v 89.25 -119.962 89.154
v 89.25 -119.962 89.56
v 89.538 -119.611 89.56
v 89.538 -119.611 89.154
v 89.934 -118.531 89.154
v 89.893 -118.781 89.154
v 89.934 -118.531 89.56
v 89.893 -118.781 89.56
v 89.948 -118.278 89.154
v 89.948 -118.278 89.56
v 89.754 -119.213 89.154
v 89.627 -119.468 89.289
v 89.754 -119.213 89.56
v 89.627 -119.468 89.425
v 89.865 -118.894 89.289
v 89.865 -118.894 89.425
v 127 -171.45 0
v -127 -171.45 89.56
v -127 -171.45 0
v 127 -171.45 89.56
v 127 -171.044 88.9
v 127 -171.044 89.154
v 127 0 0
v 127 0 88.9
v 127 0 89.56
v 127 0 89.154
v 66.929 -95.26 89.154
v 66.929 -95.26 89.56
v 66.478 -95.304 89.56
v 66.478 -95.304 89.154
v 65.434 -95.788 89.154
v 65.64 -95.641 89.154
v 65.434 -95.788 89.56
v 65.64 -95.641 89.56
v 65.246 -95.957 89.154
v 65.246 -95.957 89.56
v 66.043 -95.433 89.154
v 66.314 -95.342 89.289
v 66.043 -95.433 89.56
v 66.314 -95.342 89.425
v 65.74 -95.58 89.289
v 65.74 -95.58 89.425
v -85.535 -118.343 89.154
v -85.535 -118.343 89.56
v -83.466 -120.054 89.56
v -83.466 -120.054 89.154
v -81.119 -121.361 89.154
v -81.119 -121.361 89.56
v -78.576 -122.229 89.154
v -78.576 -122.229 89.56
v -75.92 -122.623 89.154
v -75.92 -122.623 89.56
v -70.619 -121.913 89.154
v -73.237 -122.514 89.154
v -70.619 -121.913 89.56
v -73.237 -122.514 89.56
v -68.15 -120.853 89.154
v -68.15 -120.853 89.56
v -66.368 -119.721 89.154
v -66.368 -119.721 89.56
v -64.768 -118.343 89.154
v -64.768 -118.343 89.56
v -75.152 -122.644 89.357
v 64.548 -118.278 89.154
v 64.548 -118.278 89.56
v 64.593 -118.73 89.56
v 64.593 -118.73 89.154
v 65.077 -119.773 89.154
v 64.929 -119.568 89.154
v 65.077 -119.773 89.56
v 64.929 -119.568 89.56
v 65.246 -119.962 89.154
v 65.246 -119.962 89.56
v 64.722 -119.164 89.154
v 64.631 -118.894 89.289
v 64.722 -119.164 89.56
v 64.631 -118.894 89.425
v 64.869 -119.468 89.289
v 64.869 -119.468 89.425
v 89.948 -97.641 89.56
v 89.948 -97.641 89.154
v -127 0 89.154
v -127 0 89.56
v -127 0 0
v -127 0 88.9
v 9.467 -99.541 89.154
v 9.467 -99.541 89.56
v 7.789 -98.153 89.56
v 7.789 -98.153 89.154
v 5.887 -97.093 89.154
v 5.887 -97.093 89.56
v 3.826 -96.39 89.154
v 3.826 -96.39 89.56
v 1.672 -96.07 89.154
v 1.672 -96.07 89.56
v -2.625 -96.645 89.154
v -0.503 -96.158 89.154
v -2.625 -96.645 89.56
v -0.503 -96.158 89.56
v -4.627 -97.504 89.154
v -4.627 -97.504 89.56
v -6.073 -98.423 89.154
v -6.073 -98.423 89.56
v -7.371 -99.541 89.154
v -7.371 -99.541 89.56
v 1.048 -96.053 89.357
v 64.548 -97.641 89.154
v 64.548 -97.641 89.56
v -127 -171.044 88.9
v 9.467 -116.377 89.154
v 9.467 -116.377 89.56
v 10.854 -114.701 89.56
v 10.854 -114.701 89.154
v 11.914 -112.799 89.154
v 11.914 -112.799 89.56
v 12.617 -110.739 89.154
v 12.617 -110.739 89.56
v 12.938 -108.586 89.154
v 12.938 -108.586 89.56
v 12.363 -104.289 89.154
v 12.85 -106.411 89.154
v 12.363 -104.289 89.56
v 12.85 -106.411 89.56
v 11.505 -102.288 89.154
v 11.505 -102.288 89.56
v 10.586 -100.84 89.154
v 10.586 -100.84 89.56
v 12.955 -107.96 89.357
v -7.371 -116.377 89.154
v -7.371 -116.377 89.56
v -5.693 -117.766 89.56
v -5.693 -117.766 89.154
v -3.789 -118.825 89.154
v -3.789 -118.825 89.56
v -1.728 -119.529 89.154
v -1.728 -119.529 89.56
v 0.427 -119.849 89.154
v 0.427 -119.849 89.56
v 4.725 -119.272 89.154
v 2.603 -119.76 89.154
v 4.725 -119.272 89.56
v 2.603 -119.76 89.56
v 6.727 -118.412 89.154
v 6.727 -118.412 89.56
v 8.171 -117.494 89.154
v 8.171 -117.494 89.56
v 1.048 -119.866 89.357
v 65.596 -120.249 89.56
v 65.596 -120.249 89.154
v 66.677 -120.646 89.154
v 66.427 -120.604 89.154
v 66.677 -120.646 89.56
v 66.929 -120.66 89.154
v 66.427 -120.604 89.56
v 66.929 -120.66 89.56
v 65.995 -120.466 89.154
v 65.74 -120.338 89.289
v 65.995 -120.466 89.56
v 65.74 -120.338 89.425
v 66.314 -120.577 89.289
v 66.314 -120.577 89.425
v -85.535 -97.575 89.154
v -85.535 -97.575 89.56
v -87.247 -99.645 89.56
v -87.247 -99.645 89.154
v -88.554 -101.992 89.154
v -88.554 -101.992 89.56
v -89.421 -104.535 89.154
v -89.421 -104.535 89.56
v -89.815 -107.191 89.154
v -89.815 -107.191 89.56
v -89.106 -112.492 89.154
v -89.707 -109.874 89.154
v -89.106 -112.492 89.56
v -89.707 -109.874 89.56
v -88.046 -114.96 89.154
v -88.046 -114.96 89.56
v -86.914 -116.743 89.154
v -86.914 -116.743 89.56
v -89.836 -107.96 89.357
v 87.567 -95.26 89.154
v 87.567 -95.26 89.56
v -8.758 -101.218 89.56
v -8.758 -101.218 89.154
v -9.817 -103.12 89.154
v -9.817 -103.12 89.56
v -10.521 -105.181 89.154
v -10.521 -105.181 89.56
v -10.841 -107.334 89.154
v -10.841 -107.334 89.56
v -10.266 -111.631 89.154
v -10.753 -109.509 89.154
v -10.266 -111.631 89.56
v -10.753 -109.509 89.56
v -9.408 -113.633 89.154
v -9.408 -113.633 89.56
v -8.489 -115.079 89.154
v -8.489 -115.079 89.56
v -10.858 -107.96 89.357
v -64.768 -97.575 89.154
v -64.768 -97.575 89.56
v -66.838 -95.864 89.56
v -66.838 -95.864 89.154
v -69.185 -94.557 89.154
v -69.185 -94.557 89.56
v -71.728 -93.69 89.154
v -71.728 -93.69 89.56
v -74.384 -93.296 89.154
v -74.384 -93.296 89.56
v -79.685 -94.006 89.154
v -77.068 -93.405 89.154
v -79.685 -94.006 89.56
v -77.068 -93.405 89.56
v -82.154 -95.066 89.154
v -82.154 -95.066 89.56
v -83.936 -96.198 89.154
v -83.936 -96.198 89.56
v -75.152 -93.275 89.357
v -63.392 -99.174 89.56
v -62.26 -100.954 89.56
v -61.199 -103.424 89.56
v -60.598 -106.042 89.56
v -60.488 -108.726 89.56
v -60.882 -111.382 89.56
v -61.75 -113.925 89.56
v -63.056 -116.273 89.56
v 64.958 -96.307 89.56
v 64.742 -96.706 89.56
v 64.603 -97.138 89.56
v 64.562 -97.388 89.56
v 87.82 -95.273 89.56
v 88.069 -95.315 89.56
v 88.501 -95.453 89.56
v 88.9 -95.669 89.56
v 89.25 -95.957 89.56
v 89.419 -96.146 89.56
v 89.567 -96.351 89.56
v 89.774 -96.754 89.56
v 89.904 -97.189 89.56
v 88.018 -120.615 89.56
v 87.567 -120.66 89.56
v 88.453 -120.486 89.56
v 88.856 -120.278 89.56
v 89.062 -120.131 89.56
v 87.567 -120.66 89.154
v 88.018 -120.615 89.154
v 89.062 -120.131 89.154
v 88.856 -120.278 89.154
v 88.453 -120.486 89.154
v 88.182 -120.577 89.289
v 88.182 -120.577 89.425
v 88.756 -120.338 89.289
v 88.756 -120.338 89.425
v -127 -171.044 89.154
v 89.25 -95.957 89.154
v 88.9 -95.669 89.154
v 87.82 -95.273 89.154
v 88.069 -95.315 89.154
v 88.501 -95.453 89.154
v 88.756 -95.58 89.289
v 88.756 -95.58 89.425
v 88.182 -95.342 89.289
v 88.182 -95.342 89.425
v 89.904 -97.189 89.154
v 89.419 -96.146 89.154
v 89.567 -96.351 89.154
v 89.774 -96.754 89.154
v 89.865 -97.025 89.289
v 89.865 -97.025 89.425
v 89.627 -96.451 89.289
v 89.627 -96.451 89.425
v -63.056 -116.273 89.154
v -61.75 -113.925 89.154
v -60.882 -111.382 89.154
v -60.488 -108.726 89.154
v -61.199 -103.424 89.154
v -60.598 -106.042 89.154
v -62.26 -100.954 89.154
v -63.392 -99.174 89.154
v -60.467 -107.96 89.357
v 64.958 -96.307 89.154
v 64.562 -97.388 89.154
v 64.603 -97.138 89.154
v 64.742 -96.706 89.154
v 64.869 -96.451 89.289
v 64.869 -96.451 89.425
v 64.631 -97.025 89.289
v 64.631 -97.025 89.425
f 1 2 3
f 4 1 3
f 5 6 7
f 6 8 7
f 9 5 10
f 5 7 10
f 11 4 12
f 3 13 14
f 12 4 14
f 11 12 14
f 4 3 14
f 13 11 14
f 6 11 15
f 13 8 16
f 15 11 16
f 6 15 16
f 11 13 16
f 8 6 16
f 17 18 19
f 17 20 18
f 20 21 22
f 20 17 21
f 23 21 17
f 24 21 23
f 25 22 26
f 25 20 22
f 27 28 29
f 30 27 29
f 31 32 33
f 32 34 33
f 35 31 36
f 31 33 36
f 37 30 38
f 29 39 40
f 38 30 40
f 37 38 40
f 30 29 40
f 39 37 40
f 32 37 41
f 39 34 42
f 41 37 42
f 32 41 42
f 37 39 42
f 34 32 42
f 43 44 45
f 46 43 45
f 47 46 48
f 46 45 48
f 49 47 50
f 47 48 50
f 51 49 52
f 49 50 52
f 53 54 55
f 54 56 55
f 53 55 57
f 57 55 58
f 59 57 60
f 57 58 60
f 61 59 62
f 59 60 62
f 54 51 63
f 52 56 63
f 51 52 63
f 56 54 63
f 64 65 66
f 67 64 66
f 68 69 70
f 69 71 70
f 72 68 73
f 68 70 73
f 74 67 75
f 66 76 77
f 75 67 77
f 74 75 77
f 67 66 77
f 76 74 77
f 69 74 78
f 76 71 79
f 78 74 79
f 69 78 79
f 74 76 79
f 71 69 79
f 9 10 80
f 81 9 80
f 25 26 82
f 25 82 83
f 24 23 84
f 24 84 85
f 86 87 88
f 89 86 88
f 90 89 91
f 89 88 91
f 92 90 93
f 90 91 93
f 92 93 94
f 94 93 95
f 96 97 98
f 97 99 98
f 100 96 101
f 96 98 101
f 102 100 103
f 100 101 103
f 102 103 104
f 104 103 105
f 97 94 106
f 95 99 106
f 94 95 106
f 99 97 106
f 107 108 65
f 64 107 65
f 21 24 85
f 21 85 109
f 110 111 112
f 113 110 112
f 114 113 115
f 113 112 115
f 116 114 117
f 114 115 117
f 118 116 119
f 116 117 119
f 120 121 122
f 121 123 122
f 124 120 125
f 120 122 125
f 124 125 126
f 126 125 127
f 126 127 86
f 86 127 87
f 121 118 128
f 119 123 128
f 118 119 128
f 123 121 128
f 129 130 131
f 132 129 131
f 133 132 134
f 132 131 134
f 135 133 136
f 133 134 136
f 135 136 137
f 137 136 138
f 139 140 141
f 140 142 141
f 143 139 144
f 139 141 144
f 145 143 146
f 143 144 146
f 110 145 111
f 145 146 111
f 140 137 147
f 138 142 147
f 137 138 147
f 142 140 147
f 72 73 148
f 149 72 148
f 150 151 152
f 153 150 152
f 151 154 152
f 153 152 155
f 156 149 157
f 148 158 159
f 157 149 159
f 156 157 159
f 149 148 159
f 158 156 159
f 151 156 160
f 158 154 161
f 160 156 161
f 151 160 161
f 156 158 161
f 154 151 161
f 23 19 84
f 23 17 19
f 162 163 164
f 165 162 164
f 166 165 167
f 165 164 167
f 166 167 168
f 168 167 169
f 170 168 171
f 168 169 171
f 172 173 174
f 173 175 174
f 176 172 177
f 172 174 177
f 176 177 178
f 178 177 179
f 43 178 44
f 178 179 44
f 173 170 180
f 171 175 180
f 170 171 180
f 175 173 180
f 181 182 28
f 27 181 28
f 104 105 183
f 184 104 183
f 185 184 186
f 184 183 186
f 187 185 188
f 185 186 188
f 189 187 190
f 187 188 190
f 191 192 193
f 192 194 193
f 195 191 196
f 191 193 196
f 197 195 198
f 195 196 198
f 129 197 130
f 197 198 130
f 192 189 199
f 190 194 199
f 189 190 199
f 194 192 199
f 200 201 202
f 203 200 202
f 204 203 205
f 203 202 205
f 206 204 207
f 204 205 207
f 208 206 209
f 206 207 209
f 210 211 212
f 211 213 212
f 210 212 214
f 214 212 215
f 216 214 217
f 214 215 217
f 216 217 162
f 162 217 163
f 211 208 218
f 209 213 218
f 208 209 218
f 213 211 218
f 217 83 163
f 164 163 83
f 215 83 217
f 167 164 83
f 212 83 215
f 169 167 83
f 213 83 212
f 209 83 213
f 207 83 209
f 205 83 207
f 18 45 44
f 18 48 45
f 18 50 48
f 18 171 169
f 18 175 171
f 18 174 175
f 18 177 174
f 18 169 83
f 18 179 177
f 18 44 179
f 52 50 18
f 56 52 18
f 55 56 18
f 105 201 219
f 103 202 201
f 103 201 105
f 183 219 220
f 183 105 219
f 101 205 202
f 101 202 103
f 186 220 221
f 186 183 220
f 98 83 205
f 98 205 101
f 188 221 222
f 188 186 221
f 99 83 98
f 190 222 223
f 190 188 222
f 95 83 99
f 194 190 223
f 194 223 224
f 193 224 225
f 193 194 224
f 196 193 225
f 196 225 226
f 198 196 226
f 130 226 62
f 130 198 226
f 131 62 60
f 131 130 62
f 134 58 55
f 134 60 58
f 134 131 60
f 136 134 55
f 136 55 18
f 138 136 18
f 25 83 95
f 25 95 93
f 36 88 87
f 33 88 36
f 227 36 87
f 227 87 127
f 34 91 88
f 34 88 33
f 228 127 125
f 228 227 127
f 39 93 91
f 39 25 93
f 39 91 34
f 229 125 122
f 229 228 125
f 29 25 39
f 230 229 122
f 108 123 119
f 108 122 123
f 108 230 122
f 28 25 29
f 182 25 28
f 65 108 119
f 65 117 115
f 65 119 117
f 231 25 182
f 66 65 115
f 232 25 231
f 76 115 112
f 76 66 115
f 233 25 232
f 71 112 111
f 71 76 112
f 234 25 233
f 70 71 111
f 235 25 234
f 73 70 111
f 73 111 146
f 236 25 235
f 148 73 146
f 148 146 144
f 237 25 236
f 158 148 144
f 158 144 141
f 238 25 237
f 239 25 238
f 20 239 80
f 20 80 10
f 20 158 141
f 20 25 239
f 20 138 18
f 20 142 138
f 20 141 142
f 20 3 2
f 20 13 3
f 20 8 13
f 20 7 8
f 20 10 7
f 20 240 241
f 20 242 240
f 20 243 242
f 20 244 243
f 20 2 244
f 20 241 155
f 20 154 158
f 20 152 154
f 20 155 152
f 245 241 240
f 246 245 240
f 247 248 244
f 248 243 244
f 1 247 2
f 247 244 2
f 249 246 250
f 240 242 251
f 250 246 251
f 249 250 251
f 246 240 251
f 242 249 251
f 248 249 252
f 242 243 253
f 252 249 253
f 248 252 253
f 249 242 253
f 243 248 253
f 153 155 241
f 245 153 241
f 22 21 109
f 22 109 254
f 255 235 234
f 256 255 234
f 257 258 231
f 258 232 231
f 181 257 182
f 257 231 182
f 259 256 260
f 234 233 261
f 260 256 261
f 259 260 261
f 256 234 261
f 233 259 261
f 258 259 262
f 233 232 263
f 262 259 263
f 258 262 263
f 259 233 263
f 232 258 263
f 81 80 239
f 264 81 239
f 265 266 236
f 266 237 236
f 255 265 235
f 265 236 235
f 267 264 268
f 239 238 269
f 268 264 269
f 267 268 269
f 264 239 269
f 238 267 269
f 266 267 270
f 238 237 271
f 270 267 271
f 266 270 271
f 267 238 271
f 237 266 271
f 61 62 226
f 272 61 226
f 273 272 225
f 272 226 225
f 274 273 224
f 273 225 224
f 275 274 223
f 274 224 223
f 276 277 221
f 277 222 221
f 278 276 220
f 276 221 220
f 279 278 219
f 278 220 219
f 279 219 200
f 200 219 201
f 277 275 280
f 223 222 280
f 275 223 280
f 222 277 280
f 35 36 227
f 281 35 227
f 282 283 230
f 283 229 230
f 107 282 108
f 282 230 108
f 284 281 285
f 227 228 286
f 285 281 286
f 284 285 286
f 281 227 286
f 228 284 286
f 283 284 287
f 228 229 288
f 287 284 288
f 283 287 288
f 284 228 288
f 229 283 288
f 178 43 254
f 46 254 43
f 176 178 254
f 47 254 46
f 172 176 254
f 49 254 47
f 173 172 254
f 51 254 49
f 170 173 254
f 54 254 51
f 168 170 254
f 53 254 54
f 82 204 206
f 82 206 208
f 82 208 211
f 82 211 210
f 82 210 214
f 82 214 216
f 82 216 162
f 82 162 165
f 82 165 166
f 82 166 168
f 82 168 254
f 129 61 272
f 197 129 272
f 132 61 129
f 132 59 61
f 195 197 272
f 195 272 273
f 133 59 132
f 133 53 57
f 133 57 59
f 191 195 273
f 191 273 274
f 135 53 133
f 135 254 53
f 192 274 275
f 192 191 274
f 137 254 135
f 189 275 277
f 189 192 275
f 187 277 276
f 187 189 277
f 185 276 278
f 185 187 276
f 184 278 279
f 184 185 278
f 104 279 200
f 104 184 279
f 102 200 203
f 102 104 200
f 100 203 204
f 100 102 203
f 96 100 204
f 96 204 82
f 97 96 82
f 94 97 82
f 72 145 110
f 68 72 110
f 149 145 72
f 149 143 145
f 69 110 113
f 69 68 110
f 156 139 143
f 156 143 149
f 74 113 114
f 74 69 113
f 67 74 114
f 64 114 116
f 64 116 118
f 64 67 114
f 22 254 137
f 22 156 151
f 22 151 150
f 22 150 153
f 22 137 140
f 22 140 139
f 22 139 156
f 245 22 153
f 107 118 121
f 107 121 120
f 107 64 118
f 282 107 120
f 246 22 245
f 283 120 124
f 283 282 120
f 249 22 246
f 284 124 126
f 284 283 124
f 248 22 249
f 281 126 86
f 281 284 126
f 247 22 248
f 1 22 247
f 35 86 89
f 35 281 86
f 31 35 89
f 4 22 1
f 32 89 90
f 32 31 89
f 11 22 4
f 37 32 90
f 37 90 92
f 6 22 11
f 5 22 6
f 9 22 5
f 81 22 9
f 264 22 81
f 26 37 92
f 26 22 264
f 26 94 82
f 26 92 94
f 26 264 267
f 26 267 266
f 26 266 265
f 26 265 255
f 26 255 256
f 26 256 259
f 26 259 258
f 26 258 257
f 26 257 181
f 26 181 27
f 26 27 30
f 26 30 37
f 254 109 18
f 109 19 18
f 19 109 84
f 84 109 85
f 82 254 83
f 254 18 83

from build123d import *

# Parameters (mm, degrees)
F1_DEPTH = 127
F3_DEPTH = 0.4064


# Not quite as in the source:
# - the dataset's text gives a spline's control points without its knots; the knots are read off the source's solid


with BuildPart() as f1:
    # F0 (on Right) → F1 (new body, symmetric)
    with BuildSketch(Plane.YZ):
        Polygon((-171.45, 0), (0, 0), (0, 88.9), (-171.0436, 88.9), (-171.0436, 89.154), (0, 89.154), (0, 89.5604), (-171.45, 89.5604), align=None)
    extrude(amount=F1_DEPTH, both=True)

    # F2 (on face) → F3 (cut, through all)
    with BuildSketch(Plane.XY.offset(89.5604)):
        with BuildLine():
            add(Edge.make_bspline(
                [(89.2501661772, -119.9617381969), (89.6911355772, -119.5207687969), (89.9481327772, -118.9020247969), (89.9481327772, -118.2782769969)],
                knots=[1, 1, 1, 1, 2, 2, 2, 2], degree=3))
            Line((89.9481327772, -118.2782769969), (89.9481327772, -97.6407769969))
            add(Edge.make_bspline(
                [(89.9481327772, -97.6407769969), (89.9481327772, -97.0166989969), (89.6911355772, -96.3979803969), (89.2501661772, -95.9570109969)],
                knots=[0, 0, 0, 0, 1, 1, 1, 1], degree=3))
            add(Edge.make_bspline(
                [(89.2501661772, -95.9570109969), (88.8091967772, -95.5160161969), (88.1904527772, -95.2595269969), (87.5668827772, -95.2595269969)],
                knots=[1, 1, 1, 1, 2, 2, 2, 2], degree=3))
            Line((87.5668827772, -95.2595269969), (66.9293827772, -95.2595269969))
            add(Edge.make_bspline(
                [(66.9293827772, -95.2595269969), (66.3058127772, -95.2595269969), (65.6863829772, -95.5160161969), (65.2457691772, -95.9570109969)],
                knots=[0, 0, 0, 0, 1, 1, 1, 1], degree=3))
            add(Edge.make_bspline(
                [(65.2457691772, -95.9570109969), (64.8051299772, -96.3979803969), (64.5481327772, -97.0166989969), (64.5481327772, -97.6407769969)],
                knots=[1, 1, 1, 1, 2, 2, 2, 2], degree=3))
            Line((64.5481327772, -97.6407769969), (64.5481327772, -118.2782769969))
            add(Edge.make_bspline(
                [(64.5481327772, -118.2782769969), (64.5481327772, -118.9020247969), (64.8051299772, -119.5207687969), (65.2457691772, -119.9617381969)],
                knots=[0, 0, 0, 0, 1, 1, 1, 1], degree=3))
            add(Edge.make_bspline(
                [(65.2457691772, -119.9617381969), (65.6863829772, -120.4023519969), (66.3058127772, -120.6595269969), (66.9293827772, -120.6595269969)],
                knots=[1, 1, 1, 1, 2, 2, 2, 2], degree=3))
            Line((66.9293827772, -120.6595269969), (87.5668827772, -120.6595269969))
            add(Edge.make_bspline(
                [(87.5668827772, -120.6595269969), (88.1904527772, -120.6595269969), (88.8091967772, -120.4023519969), (89.2501661772, -119.9617381969)],
                knots=[0, 0, 0, 0, 1, 1, 1, 1], degree=3))
        make_face()
        with BuildLine():
            add(Edge.make_bspline(
                [(-64.7683472228, -97.5754989969), (-67.4865282228, -94.8573179969), (-71.3078058228, -93.2749995969), (-75.1518672228, -93.2749995969)],
                knots=[7, 7, 7, 7, 8, 8, 8, 8], degree=3))
            add(Edge.make_bspline(
                [(-75.1518672228, -93.2749995969), (-78.9959032228, -93.2749995969), (-82.8171808228, -94.8573179969), (-85.5353872228, -97.5754989969)],
                knots=[0, 0, 0, 0, 1, 1, 1, 1], degree=3))
            add(Edge.make_bspline(
                [(-85.5353872228, -97.5754989969), (-88.2542286228, -100.2940101969), (-89.8362422228, -104.1149829969), (-89.8362422228, -107.9595269969), (-89.8362422228, -111.8033851969), (-88.2542286228, -115.6243579969), (-85.5353872228, -118.3425389969)],
                knots=[1, 1, 1, 1, 2, 2, 2, 3, 3, 3, 3], degree=3))
            add(Edge.make_bspline(
                [(-85.5353872228, -118.3425389969), (-82.8171808228, -121.0614057969), (-78.9959032228, -122.6440797969), (-75.1518672228, -122.6440797969), (-71.3078058228, -122.6440797969), (-67.4865282228, -121.0614057969), (-64.7683472228, -118.3425389969)],
                knots=[3, 3, 3, 3, 4, 4, 4, 5, 5, 5, 5], degree=3))
            add(Edge.make_bspline(
                [(-64.7683472228, -118.3425389969), (-62.0501408228, -115.6243579969), (-60.4674922228, -111.8033851969), (-60.4674922228, -107.9595269969), (-60.4674922228, -104.1149829969), (-62.0501408228, -100.2940101969), (-64.7683472228, -97.5754989969)],
                knots=[5, 5, 5, 5, 6, 6, 6, 7, 7, 7, 7], degree=3))
        make_face()
        with BuildLine():
            add(Edge.make_bspline(
                [(9.4669119772, -99.5405953969), (7.2627507772, -97.3364087969), (4.1656017772, -96.0532769969), (1.0484883772, -96.0532769969)],
                knots=[7, 7, 7, 7, 8, 8, 8, 8], degree=3))
            add(Edge.make_bspline(
                [(1.0484883772, -96.0532769969), (-2.0690060228, -96.0532769969), (-5.1664598228, -97.3364087969), (-7.3706464228, -99.5405953969)],
                knots=[0, 0, 0, 0, 1, 1, 1, 1], degree=3))
            add(Edge.make_bspline(
                [(-7.3706464228, -99.5405953969), (-9.5748076228, -101.7447311969), (-10.8577616228, -104.8424135969), (-10.8577616228, -107.9595269969), (-10.8577616228, -111.0768435969), (-9.5748076228, -114.1744751969), (-7.3706464228, -116.3774679969)],
                knots=[1, 1, 1, 1, 2, 2, 2, 3, 3, 3, 3], degree=3))
            add(Edge.make_bspline(
                [(-7.3706464228, -116.3774679969), (-5.1664598228, -118.5816291969), (-2.0690060228, -119.8657769969), (1.0484883772, -119.8657769969), (4.1656017772, -119.8657769969), (7.2627507772, -118.5816291969), (9.4669119772, -116.3774679969)],
                knots=[3, 3, 3, 3, 4, 4, 4, 5, 5, 5, 5], degree=3))
            add(Edge.make_bspline(
                [(9.4669119772, -116.3774679969), (11.6710985772, -114.1744751969), (12.9547383772, -111.0768435969), (12.9547383772, -107.9595269969), (12.9547383772, -104.8424135969), (11.6710985772, -101.7447311969), (9.4669119772, -99.5405953969)],
                knots=[5, 5, 5, 5, 6, 6, 6, 7, 7, 7, 7], degree=3))
        make_face()
    extrude(amount=-F3_DEPTH, mode=Mode.SUBTRACT)


solid = f1.part
